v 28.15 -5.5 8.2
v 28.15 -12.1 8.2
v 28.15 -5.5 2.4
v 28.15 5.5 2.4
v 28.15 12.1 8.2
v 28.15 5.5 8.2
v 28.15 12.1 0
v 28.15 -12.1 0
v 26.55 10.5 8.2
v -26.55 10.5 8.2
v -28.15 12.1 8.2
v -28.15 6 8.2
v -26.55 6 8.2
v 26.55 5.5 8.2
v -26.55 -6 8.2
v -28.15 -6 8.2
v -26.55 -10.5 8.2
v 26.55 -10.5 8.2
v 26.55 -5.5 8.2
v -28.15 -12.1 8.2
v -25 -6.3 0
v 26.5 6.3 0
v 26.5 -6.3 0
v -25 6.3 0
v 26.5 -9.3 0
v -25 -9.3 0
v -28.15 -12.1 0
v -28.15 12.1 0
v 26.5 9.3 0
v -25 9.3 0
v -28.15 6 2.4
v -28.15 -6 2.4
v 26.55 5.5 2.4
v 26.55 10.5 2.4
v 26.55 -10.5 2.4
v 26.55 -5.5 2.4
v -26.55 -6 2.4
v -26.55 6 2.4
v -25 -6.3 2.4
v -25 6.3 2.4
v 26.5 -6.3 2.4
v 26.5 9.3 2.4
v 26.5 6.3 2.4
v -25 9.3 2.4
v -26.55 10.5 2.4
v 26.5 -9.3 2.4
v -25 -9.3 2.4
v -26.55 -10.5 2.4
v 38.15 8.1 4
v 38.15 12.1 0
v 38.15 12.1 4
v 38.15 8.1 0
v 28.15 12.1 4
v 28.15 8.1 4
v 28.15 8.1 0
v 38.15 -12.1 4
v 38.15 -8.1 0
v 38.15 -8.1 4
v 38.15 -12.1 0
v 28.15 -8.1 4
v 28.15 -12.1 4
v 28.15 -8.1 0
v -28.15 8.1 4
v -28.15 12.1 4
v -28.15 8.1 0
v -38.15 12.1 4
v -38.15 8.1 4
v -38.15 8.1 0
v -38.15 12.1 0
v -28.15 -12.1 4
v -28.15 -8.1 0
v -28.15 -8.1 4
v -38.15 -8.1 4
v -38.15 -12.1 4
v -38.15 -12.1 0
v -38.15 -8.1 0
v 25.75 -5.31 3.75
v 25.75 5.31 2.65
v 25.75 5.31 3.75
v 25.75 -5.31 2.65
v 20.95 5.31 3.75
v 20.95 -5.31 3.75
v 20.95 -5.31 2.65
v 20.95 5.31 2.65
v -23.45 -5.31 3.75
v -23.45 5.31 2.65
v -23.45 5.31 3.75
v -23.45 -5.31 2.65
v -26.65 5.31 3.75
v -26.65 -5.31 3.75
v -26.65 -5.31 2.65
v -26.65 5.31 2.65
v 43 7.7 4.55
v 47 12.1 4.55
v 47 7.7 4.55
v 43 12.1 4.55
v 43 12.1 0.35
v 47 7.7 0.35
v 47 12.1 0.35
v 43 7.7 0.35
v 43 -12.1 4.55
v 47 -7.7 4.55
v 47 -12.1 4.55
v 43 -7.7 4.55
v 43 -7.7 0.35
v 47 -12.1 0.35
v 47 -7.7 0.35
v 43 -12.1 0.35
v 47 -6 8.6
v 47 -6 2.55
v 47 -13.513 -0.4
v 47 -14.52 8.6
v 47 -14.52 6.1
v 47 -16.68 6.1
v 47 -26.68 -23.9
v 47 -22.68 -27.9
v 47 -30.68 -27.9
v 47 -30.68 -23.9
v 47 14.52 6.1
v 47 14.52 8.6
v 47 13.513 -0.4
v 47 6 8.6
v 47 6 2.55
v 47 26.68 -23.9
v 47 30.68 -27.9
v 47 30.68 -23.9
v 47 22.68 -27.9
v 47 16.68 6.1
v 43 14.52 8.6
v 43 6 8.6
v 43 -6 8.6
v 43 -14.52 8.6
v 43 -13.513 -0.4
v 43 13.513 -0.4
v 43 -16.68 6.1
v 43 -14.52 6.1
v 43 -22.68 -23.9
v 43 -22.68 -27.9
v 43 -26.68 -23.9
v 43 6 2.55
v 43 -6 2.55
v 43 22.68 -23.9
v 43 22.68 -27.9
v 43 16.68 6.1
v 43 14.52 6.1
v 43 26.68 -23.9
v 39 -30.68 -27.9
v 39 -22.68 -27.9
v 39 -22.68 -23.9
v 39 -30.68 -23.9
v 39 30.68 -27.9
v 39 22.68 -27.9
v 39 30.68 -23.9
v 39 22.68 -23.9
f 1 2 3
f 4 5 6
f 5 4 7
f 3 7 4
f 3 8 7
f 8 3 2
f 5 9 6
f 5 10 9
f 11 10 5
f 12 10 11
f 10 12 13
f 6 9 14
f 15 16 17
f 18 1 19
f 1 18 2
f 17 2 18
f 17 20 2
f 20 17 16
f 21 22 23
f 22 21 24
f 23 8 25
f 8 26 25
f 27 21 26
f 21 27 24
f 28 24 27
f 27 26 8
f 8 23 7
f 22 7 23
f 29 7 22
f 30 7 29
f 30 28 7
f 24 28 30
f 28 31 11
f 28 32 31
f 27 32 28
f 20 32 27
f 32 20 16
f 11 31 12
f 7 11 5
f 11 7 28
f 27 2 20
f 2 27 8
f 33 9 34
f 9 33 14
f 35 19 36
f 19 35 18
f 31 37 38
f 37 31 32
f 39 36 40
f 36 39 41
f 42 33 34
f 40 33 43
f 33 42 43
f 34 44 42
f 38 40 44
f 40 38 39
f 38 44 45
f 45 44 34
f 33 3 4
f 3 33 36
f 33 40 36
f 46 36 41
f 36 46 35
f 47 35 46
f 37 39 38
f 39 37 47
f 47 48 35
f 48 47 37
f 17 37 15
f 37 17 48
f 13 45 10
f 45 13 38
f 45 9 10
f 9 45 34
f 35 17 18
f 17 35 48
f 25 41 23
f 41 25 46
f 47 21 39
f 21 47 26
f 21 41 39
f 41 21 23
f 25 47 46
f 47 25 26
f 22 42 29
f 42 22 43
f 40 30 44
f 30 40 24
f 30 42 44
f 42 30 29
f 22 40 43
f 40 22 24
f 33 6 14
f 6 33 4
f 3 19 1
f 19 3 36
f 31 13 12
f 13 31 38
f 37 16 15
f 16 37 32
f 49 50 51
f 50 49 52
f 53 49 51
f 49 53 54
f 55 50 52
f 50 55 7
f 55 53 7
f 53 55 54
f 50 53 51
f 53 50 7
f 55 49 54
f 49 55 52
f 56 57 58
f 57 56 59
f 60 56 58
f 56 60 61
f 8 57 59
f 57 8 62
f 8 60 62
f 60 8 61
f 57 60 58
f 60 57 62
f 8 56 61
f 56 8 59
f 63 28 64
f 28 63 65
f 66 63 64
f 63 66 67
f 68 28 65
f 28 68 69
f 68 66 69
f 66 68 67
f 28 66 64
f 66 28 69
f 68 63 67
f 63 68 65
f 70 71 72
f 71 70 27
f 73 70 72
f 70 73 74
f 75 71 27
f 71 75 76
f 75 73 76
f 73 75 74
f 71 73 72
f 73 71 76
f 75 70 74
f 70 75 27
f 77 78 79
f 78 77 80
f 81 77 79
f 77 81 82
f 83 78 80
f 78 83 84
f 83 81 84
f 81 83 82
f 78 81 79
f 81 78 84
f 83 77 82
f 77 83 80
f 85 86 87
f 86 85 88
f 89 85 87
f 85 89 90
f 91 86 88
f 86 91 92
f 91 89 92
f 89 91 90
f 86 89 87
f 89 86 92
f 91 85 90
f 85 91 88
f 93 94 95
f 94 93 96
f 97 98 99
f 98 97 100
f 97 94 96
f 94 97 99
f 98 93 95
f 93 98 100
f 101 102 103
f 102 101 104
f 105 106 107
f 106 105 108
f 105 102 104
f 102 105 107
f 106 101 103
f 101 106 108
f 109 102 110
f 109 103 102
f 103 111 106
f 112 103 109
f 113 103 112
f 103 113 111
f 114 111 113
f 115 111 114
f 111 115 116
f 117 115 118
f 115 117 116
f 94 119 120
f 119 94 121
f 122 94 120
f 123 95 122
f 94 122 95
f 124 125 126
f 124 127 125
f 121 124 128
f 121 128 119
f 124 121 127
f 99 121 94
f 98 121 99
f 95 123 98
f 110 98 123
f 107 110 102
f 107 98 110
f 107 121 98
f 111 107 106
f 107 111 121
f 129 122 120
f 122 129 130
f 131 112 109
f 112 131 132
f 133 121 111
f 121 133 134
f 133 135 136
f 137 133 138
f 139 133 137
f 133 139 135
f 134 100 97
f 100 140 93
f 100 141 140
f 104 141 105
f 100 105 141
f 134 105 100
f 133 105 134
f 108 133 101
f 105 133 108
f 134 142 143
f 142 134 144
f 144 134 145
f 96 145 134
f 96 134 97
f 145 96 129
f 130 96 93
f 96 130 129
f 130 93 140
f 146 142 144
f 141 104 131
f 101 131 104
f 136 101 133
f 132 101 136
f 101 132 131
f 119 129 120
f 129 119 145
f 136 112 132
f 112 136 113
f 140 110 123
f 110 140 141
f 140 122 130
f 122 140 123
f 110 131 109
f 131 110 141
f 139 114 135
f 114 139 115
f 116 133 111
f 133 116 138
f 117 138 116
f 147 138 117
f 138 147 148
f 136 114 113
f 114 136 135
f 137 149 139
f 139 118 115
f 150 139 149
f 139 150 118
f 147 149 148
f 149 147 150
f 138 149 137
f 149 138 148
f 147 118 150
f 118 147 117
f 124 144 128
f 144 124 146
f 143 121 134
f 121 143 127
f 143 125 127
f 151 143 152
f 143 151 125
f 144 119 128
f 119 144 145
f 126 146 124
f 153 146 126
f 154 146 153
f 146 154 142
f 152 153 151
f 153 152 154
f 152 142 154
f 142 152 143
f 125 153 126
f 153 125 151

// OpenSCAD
// file: BlackPill_F411_ProtoCase_params.scad
//Board parameters
board_length = 52.8;
board_width = 20.7;
pcb_thickness = 1.5;
pcb_max_clearance_top = 4.0; //max height of components on top of PCB
pcb_max_clearance_bottom = 1.1; //height of components on bottom of PCB
pcb_wall_margin = 0.15; //margin from edge of PCB to any walls

pin_row_length = 50.7;
pin_row_width = 2.4;
pin_length = 0.5;
pin_width = 0.6;
pin_plastic_height = 2.8;
pin_row_width_separation = 12.6;
pin_row_dist_from_bottom = 2;

wall_thickness = 1.6;
base_thickness = 1.6;

//ledge_protrusion = 3.0;

swd_header_protrusion = 3.0;
swd_joint_dist_from_bottom = 1.5;
swd_width = 12.0;

usb_width = 11;


//Calculated parameters
inner_height = pcb_thickness + pcb_max_clearance_top + pcb_max_clearance_bottom;
inner_length = board_length + pcb_wall_margin*2;
inner_width = board_width + pcb_wall_margin*2;

full_length = inner_length + wall_thickness*2;
full_width =  inner_width + wall_thickness*2;
full_height = base_thickness + inner_height;
// main file
//include our parameters file
//"include <filename> acts as if the contents of the included file were written in the including file"
//allowing us to use the variables as if they were defined here
include <BlackPill_F411_ProtoCase_params.scad>

//The case
translate([0,0,full_height/2]) blackpill_f411_protocase();

//The legs. Rotate 90 degrees in the slicer before printing.
translate([45, 0, full_height/2]) blackpill_f411_protocase_leg();

module blackpill_f411_protocase()
{
    pin_width_margin = 0.3; //0.3 larger on each side
    pin_length_margin = 0.4;
    
    union()
    {
        difference()
        {
            //main box
            cube([full_length, full_width, full_height], center=true);
            
            //main cutout for board
            translate([0,0,base_thickness]) cube([inner_length, inner_width, inner_height], center=true);
            
            //cutout for left row of pins
            //The cutout are little larger than the actual dimensions to give some margin for printing error
            translate([-(board_length-pin_row_length-pin_length_margin)/2+1.6,-pin_row_width_separation/2-pin_row_width/2-pin_width_margin,-base_thickness]) cube([pin_row_length+pin_length_margin*2, pin_row_width+pin_width_margin*2, inner_height], center=true);
            
            //cutout for right row of pins
            translate([-(board_length-pin_row_length-pin_length_margin)/2+1.6,pin_row_width_separation/2+pin_row_width/2+pin_width_margin,-base_thickness]) cube([pin_row_length+pin_length_margin*2, pin_row_width+pin_width_margin*2, inner_height], center=true);
            
            //USB cutout
            translate([full_length/2,0,base_thickness]) cube([wall_thickness*2, usb_width, inner_height], center=true);
            
            //SWD cutout
            translate([-full_length/2,0,base_thickness]) cube([wall_thickness*2, swd_width, inner_height], center=true);
        }
        
        //top mount points for legs
        translate([full_length/2+10/2,0,-pcb_max_clearance_bottom/2]) leg_mount_points(4,10, 4);
        
        //bottom mount points for legs
        translate([-full_length/2-10/2,0,-pcb_max_clearance_bottom/2]) leg_mount_points(4,10,4);
        
        //top ledge
        translate([inner_length/2-wall_thickness*2, 0, -pcb_max_clearance_bottom/2-0.35]) cube([wall_thickness*3, inner_length/5, pcb_max_clearance_bottom], center=true);
        
        //bottom ledge
        translate([-inner_length/2 + swd_joint_dist_from_bottom, 0, -pcb_max_clearance_bottom/2 - 0.35]) cube([wall_thickness*2, inner_length/5, pcb_max_clearance_bottom], center=true);
        
    }
   
    
}

module leg_mount_points(mount_width, mount_length, mount_height)
{
    
    translate([0, 0, 0]) union()
    {
        //left
        translate([0,full_width/2-mount_width/2,-mount_height/2+base_thickness/2-0.35]) cube([mount_length, mount_width, mount_height],center=true);
        
        //right
         translate([0,-full_width/2+mount_width/2,-mount_height/2+base_thickness/2-0.35]) cube([mount_length, mount_width, mount_height],center=true);
    }
}


module blackpill_f411_protocase_leg()
{   
    port_cutout_height = 5.1;
    
    mount_height = 4 + 0.2;
    mount_width = 5;
    mount_length = 4 + 0.4;
    
    frame_w = full_width*1.2;
    frame_h = full_height+base_thickness/2;
    
    union()
    {
        //portion that couples with case
        difference()
        {
            //start with a general size of the portion that couples to the case
            cube([4, frame_w, frame_h], center=true);
            
            //mount points to case
            translate([0,0,0]) leg_mount_points(mount_length, mount_width, mount_height);
            
            //port cutout
            translate([0,0,1+port_cutout_height/2]) cube([4,swd_width,port_cutout_height*2], center=true);
        }
        
        //legs
        translate([0, -frame_w/3-5, 0]) diag_leg();
        
        translate([0, frame_w/3+5, 0]) mirror([0,1,0]) diag_leg();
        
        //upper bar and board retainer
        retainer_w = (full_width - swd_width)/2;
        retainer_h = 2;
        //left
        //translate([0,-(full_width*1.2)/3,5]) cube([4, 6, 2], center=true);
        //translate([-5, -(full_width)/2+retainer_w/2, frame_h/2+retainer_h/2]) cube([full_length/4, retainer_w, retainer_h],center=true);
        
        //right
        //translate([0,full_width/3+0.93,5]) cube([4, 6, 2], center=true);
        //translate([-5, (full_width)/2-retainer_w/2, frame_h/2+retainer_h/2]) cube([full_length/4, retainer_w, retainer_h], center=true);
    }
    
}

module diag_leg()
{
    cube_dim = 4;
    vertical_drop = 30;
    horizontal_dist = 10;
    
    union()
    {
        hull()
        {   
            cube([cube_dim, cube_dim, cube_dim], center=true);
            
            translate([0, -horizontal_dist, -vertical_drop]) cube([cube_dim, cube_dim, cube_dim], center=true);
         
        }
        
        //foot
        //translate([cube_dim/2, -horizontal_dist-cube_dim/2, -vertical_drop]) cube([2*cube_dim, 3*cube_dim, cube_dim], center=true);
        translate([-cube_dim/2, -horizontal_dist-cube_dim/2, -vertical_drop]) cube([2*cube_dim, 2*cube_dim, cube_dim], center=true);
        
        //retaining strips for board
        //left
        
        //right
        
    }
    
}
